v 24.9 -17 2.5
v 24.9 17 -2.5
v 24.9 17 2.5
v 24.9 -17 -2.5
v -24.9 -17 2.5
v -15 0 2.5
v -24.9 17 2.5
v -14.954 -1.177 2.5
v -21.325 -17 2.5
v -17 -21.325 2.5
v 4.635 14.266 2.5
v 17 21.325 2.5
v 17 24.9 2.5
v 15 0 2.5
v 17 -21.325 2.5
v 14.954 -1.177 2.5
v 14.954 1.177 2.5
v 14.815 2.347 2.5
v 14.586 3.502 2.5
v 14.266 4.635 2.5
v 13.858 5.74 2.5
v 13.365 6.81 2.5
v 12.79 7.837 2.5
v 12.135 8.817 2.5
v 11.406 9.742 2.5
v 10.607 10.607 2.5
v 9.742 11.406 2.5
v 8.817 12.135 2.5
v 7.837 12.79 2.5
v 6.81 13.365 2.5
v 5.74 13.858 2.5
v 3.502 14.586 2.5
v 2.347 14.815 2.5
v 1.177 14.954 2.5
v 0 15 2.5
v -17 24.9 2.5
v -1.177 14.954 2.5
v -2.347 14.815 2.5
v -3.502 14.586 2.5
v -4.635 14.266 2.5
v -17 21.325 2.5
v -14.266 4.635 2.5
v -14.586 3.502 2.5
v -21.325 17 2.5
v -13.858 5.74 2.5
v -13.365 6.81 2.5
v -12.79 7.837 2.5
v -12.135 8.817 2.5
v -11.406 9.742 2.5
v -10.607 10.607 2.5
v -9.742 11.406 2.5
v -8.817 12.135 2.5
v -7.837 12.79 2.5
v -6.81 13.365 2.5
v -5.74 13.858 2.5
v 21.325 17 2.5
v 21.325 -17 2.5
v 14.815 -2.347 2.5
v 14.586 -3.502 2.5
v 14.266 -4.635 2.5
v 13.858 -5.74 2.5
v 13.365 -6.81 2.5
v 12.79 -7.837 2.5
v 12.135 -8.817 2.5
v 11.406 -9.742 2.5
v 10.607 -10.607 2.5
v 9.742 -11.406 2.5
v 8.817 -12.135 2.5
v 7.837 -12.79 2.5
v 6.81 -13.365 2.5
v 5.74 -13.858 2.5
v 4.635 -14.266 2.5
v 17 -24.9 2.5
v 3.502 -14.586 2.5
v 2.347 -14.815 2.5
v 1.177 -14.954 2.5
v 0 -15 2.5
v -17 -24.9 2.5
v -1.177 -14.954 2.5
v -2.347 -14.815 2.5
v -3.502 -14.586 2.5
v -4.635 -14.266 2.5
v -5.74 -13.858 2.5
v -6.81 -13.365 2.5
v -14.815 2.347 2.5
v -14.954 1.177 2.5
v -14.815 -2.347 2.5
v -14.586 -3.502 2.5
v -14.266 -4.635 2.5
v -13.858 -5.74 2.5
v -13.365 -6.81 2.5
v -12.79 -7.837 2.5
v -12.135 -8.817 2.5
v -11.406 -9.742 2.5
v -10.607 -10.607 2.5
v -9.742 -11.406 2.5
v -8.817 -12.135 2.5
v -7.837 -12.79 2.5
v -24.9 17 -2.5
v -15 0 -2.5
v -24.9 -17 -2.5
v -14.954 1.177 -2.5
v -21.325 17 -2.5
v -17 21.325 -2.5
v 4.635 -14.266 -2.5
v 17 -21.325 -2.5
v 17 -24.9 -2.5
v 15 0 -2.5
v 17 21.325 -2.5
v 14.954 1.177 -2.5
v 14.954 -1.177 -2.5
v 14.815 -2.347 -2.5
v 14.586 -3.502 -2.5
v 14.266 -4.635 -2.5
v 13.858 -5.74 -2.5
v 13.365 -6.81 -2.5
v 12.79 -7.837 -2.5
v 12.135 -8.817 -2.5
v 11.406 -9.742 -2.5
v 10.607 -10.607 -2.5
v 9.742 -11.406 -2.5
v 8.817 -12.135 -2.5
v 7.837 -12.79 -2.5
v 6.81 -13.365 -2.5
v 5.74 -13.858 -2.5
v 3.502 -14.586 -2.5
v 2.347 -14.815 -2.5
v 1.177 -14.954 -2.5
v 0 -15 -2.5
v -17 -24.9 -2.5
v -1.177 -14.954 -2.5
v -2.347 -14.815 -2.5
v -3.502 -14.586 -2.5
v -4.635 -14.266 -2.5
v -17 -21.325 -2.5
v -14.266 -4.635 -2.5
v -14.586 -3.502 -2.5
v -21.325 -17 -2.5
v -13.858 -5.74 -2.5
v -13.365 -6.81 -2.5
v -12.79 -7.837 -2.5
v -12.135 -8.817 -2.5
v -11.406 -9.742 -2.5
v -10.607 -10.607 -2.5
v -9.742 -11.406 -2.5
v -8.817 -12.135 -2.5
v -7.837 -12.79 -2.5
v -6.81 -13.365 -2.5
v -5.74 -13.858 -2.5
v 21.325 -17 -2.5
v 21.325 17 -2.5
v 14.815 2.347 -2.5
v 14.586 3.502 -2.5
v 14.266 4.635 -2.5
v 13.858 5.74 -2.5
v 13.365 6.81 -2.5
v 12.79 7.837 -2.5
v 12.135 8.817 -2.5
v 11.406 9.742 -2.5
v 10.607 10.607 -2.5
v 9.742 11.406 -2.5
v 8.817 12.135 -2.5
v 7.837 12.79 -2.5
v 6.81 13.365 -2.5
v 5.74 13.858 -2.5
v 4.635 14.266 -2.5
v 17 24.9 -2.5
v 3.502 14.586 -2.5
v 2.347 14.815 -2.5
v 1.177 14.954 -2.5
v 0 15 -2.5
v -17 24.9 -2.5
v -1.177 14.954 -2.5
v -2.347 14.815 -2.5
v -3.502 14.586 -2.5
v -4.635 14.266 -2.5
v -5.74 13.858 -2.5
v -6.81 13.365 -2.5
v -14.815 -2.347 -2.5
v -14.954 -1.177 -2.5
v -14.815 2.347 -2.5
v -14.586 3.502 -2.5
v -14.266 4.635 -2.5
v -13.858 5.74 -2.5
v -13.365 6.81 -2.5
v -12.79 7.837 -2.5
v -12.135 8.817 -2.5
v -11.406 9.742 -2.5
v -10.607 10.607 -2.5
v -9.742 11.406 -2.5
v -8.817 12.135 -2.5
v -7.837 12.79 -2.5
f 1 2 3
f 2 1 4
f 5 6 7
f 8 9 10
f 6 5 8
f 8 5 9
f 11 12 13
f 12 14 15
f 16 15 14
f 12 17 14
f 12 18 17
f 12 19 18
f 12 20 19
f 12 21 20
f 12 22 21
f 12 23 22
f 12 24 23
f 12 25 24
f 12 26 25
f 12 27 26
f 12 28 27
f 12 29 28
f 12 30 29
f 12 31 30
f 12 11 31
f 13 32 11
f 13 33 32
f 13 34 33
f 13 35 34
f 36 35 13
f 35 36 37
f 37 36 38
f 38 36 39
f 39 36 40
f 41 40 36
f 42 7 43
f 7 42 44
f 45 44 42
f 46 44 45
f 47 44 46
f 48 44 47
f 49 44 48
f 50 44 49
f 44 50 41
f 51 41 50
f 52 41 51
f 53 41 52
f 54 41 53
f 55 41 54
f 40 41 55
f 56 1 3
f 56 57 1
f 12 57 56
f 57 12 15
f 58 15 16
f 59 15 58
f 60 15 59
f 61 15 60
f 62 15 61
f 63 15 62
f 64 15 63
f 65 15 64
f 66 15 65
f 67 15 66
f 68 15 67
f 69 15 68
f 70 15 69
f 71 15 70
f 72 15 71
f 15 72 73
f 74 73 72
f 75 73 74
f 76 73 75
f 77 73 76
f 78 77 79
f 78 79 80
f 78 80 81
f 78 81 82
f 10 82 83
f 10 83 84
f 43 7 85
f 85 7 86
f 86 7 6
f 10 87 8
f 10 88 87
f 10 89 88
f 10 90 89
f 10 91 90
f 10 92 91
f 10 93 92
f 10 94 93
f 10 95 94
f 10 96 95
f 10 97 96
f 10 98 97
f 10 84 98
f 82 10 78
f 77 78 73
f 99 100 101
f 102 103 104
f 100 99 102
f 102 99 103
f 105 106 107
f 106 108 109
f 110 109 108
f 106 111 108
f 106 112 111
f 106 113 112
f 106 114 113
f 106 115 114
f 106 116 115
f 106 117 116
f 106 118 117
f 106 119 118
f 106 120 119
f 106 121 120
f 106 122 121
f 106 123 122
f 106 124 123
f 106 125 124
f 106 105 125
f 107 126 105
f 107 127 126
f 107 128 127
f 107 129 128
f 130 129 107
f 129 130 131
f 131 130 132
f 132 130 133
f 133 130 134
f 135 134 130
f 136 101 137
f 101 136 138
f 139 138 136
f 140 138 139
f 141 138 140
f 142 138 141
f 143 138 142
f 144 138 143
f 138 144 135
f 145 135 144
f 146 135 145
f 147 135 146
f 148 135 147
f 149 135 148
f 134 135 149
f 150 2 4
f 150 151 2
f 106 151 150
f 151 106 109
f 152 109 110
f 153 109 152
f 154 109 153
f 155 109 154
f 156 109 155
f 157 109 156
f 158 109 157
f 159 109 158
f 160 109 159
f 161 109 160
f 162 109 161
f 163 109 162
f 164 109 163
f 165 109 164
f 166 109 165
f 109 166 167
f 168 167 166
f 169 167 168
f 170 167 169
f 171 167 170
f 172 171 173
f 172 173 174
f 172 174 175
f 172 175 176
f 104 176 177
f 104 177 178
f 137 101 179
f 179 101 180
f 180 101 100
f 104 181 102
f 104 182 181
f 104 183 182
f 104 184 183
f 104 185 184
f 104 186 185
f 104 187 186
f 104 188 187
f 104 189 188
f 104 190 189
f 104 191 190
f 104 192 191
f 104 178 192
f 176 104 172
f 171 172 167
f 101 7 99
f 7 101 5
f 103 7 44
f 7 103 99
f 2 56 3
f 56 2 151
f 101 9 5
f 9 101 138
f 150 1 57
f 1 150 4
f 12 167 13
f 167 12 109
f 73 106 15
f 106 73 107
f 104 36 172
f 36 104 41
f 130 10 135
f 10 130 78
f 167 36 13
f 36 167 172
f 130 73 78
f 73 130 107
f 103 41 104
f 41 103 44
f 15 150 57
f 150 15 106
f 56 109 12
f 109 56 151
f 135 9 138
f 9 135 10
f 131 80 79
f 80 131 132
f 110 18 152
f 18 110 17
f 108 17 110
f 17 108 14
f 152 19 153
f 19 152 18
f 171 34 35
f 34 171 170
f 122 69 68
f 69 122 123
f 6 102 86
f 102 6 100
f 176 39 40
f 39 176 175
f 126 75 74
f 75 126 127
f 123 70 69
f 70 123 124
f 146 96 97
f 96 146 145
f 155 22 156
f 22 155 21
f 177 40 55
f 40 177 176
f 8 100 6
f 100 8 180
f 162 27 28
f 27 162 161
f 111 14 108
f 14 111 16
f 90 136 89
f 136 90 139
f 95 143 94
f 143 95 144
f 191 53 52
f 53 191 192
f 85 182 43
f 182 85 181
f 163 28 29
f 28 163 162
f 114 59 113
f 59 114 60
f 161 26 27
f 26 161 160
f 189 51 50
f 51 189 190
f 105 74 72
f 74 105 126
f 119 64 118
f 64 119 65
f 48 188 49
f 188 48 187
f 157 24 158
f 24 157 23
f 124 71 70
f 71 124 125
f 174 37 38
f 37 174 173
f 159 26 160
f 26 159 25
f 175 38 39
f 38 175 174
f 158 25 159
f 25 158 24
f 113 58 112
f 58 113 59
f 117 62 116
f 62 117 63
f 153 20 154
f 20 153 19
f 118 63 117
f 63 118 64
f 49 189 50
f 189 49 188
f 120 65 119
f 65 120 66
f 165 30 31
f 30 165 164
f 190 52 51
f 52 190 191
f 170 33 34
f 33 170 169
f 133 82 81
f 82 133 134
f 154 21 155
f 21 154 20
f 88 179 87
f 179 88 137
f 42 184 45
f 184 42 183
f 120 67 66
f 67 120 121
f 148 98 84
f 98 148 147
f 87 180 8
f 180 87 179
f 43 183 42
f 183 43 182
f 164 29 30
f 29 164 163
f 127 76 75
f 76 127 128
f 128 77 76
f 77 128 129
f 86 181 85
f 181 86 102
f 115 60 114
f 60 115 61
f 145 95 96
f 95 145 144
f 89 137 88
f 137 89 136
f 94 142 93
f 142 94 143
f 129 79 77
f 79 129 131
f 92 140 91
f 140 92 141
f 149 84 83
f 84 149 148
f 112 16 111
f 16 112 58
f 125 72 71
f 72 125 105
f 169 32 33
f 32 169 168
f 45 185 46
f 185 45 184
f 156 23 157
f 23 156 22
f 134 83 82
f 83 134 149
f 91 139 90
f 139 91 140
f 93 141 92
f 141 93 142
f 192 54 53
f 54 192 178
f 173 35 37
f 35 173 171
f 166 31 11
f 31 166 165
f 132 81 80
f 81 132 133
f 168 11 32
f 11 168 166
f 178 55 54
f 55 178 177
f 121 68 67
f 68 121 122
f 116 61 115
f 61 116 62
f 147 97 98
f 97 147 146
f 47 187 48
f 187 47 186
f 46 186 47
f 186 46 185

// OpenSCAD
//Cube insert: Perpendicular 
/* [User] */
eyepiece_diameter = 30; //[10:0.01:42]

/* [Hiden] */
$fn = 80;
eps = .002;
a = 49.8;
b = 33.6;
c = 6.28;
d = 53.8;
h = 5;
IM_offset = 0.2;

insert();

module insert() {
    difference() {
        union() {   //basic insert design
                cube([a,b+2*IM_offset,h], center=true);
                cube([b+2*IM_offset,a,h], center=true);
                rotate(a=[0,0,45]){
                    cube([c,d+2*IM_offset,h], center=true);
                }
                rotate(a=[0,0,-45]){
                    cube([c,d+2*IM_offset,h], center=true);
                }
            }
        cylinder(h+eps,d=eyepiece_diameter, center = true);
    }
}
